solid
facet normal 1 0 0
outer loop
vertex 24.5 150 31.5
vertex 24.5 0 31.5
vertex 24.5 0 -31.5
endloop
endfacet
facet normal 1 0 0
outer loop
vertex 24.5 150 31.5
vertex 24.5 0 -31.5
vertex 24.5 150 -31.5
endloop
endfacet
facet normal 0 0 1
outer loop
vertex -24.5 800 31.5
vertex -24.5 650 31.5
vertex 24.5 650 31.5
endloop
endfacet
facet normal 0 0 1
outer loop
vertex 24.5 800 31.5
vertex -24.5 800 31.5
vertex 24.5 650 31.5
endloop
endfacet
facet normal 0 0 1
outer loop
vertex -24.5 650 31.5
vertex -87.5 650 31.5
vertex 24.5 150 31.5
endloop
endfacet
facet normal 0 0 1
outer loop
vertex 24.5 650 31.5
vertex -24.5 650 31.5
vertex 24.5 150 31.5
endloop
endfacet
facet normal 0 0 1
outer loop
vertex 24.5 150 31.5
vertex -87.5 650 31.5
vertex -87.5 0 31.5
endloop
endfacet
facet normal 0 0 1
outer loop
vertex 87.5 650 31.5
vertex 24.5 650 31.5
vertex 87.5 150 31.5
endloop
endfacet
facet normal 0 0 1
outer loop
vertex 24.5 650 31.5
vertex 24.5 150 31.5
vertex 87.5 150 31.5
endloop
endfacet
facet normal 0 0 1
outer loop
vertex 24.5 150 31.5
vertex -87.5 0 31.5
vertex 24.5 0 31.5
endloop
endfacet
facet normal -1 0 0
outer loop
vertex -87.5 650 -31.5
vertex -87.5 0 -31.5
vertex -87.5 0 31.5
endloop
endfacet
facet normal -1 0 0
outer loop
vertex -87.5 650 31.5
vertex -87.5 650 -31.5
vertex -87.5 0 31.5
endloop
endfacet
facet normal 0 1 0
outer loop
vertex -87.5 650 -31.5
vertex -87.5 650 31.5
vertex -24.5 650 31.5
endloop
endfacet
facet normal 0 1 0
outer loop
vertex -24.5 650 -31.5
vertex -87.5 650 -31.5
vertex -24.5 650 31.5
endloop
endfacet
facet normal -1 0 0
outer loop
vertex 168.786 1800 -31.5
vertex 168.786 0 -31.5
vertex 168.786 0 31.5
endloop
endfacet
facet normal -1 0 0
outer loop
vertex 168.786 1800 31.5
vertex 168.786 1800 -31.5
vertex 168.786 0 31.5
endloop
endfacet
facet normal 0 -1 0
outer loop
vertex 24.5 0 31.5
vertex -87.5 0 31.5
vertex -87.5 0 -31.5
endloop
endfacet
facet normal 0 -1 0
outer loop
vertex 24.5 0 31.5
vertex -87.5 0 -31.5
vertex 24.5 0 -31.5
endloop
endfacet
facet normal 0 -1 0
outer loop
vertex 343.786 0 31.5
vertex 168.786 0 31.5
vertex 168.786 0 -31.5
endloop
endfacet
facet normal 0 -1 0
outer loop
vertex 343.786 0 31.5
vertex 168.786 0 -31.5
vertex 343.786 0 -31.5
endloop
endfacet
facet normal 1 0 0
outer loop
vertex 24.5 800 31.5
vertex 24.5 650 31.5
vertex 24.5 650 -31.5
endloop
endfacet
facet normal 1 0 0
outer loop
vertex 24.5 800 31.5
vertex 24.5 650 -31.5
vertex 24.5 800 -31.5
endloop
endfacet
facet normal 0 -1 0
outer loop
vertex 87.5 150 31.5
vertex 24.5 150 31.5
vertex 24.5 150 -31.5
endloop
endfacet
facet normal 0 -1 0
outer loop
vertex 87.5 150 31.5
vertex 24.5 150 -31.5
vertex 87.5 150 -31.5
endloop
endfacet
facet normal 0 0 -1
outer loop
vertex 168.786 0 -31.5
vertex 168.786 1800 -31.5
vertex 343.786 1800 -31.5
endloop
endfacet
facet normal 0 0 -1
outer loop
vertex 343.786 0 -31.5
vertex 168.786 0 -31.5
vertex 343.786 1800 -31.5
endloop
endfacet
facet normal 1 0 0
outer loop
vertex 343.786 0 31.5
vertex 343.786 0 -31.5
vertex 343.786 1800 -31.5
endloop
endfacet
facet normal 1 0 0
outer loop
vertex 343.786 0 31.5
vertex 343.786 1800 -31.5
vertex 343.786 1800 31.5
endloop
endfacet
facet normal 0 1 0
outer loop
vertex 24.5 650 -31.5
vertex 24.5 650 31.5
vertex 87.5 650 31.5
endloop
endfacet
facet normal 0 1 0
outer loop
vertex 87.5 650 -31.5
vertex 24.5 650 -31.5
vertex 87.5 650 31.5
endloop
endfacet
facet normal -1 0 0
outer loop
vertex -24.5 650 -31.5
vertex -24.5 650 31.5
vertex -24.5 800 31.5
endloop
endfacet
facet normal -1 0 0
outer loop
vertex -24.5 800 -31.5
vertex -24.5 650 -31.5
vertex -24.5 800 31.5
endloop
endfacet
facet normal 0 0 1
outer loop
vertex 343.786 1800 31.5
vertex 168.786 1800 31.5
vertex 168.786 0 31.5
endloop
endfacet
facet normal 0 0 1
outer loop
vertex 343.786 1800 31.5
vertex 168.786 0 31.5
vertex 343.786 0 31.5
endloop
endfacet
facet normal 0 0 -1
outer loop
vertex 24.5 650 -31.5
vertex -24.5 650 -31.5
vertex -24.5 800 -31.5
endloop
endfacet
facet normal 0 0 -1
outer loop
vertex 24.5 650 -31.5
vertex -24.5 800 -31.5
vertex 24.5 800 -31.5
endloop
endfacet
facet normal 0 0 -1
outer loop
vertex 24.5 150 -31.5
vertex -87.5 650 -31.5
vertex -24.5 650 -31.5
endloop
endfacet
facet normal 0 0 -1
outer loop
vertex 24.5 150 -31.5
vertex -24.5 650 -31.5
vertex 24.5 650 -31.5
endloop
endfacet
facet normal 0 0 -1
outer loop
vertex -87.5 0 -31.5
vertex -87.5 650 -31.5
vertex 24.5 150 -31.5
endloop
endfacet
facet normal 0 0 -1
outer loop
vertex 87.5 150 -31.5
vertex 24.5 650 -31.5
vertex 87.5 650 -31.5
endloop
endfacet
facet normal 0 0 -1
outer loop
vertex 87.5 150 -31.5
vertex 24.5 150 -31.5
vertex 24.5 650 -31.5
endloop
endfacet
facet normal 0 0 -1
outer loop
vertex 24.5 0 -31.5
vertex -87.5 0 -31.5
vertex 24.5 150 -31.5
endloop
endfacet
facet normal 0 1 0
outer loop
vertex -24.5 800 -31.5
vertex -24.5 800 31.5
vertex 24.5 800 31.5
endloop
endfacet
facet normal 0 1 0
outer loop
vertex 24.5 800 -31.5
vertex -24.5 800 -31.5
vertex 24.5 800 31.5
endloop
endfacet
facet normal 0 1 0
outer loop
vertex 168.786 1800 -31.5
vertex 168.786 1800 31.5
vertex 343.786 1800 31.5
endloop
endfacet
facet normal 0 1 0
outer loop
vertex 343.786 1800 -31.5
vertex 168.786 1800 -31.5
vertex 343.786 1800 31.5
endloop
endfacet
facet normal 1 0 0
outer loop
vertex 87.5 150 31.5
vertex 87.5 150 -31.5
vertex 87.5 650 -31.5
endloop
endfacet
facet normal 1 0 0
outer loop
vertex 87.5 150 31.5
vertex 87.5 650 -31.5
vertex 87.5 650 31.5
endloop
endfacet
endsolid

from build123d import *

# Parameters (mm, degrees)
F0_W     = 175
F0_H     = 63
F1_DEPTH = 800
F2_W     = 63
F2_H     = 150
F3_DEPTH = 63.001
F4_W     = 175
F4_H     = 63
F5_DEPTH = 1800


with BuildPart() as f1:
    # F0 (on Front) → F1 (new body)
    with BuildSketch(Plane.XZ):
        Rectangle(F0_W, F0_H)
    extrude(amount=-F1_DEPTH)

    # F2 (on face) → F3 (cut, through all)
    with BuildSketch(Plane.XY.offset(31.5)):
        with Locations((56, 75)):
            Rectangle(F2_W, F2_H)
        with Locations((-56, 725)):
            Rectangle(F2_W, F2_H)
        with Locations((56, 725)):
            Rectangle(F2_W, F2_H)
    extrude(amount=-F3_DEPTH, mode=Mode.SUBTRACT)


with BuildPart() as f5:
    # F4 (on Front) → F5 (new body)
    with BuildSketch(Plane.XZ):
        with Locations((256.285995, 0)):
            Rectangle(F4_W, F4_H)
    extrude(amount=-F5_DEPTH)


solid = Compound([f1.part, f5.part])
